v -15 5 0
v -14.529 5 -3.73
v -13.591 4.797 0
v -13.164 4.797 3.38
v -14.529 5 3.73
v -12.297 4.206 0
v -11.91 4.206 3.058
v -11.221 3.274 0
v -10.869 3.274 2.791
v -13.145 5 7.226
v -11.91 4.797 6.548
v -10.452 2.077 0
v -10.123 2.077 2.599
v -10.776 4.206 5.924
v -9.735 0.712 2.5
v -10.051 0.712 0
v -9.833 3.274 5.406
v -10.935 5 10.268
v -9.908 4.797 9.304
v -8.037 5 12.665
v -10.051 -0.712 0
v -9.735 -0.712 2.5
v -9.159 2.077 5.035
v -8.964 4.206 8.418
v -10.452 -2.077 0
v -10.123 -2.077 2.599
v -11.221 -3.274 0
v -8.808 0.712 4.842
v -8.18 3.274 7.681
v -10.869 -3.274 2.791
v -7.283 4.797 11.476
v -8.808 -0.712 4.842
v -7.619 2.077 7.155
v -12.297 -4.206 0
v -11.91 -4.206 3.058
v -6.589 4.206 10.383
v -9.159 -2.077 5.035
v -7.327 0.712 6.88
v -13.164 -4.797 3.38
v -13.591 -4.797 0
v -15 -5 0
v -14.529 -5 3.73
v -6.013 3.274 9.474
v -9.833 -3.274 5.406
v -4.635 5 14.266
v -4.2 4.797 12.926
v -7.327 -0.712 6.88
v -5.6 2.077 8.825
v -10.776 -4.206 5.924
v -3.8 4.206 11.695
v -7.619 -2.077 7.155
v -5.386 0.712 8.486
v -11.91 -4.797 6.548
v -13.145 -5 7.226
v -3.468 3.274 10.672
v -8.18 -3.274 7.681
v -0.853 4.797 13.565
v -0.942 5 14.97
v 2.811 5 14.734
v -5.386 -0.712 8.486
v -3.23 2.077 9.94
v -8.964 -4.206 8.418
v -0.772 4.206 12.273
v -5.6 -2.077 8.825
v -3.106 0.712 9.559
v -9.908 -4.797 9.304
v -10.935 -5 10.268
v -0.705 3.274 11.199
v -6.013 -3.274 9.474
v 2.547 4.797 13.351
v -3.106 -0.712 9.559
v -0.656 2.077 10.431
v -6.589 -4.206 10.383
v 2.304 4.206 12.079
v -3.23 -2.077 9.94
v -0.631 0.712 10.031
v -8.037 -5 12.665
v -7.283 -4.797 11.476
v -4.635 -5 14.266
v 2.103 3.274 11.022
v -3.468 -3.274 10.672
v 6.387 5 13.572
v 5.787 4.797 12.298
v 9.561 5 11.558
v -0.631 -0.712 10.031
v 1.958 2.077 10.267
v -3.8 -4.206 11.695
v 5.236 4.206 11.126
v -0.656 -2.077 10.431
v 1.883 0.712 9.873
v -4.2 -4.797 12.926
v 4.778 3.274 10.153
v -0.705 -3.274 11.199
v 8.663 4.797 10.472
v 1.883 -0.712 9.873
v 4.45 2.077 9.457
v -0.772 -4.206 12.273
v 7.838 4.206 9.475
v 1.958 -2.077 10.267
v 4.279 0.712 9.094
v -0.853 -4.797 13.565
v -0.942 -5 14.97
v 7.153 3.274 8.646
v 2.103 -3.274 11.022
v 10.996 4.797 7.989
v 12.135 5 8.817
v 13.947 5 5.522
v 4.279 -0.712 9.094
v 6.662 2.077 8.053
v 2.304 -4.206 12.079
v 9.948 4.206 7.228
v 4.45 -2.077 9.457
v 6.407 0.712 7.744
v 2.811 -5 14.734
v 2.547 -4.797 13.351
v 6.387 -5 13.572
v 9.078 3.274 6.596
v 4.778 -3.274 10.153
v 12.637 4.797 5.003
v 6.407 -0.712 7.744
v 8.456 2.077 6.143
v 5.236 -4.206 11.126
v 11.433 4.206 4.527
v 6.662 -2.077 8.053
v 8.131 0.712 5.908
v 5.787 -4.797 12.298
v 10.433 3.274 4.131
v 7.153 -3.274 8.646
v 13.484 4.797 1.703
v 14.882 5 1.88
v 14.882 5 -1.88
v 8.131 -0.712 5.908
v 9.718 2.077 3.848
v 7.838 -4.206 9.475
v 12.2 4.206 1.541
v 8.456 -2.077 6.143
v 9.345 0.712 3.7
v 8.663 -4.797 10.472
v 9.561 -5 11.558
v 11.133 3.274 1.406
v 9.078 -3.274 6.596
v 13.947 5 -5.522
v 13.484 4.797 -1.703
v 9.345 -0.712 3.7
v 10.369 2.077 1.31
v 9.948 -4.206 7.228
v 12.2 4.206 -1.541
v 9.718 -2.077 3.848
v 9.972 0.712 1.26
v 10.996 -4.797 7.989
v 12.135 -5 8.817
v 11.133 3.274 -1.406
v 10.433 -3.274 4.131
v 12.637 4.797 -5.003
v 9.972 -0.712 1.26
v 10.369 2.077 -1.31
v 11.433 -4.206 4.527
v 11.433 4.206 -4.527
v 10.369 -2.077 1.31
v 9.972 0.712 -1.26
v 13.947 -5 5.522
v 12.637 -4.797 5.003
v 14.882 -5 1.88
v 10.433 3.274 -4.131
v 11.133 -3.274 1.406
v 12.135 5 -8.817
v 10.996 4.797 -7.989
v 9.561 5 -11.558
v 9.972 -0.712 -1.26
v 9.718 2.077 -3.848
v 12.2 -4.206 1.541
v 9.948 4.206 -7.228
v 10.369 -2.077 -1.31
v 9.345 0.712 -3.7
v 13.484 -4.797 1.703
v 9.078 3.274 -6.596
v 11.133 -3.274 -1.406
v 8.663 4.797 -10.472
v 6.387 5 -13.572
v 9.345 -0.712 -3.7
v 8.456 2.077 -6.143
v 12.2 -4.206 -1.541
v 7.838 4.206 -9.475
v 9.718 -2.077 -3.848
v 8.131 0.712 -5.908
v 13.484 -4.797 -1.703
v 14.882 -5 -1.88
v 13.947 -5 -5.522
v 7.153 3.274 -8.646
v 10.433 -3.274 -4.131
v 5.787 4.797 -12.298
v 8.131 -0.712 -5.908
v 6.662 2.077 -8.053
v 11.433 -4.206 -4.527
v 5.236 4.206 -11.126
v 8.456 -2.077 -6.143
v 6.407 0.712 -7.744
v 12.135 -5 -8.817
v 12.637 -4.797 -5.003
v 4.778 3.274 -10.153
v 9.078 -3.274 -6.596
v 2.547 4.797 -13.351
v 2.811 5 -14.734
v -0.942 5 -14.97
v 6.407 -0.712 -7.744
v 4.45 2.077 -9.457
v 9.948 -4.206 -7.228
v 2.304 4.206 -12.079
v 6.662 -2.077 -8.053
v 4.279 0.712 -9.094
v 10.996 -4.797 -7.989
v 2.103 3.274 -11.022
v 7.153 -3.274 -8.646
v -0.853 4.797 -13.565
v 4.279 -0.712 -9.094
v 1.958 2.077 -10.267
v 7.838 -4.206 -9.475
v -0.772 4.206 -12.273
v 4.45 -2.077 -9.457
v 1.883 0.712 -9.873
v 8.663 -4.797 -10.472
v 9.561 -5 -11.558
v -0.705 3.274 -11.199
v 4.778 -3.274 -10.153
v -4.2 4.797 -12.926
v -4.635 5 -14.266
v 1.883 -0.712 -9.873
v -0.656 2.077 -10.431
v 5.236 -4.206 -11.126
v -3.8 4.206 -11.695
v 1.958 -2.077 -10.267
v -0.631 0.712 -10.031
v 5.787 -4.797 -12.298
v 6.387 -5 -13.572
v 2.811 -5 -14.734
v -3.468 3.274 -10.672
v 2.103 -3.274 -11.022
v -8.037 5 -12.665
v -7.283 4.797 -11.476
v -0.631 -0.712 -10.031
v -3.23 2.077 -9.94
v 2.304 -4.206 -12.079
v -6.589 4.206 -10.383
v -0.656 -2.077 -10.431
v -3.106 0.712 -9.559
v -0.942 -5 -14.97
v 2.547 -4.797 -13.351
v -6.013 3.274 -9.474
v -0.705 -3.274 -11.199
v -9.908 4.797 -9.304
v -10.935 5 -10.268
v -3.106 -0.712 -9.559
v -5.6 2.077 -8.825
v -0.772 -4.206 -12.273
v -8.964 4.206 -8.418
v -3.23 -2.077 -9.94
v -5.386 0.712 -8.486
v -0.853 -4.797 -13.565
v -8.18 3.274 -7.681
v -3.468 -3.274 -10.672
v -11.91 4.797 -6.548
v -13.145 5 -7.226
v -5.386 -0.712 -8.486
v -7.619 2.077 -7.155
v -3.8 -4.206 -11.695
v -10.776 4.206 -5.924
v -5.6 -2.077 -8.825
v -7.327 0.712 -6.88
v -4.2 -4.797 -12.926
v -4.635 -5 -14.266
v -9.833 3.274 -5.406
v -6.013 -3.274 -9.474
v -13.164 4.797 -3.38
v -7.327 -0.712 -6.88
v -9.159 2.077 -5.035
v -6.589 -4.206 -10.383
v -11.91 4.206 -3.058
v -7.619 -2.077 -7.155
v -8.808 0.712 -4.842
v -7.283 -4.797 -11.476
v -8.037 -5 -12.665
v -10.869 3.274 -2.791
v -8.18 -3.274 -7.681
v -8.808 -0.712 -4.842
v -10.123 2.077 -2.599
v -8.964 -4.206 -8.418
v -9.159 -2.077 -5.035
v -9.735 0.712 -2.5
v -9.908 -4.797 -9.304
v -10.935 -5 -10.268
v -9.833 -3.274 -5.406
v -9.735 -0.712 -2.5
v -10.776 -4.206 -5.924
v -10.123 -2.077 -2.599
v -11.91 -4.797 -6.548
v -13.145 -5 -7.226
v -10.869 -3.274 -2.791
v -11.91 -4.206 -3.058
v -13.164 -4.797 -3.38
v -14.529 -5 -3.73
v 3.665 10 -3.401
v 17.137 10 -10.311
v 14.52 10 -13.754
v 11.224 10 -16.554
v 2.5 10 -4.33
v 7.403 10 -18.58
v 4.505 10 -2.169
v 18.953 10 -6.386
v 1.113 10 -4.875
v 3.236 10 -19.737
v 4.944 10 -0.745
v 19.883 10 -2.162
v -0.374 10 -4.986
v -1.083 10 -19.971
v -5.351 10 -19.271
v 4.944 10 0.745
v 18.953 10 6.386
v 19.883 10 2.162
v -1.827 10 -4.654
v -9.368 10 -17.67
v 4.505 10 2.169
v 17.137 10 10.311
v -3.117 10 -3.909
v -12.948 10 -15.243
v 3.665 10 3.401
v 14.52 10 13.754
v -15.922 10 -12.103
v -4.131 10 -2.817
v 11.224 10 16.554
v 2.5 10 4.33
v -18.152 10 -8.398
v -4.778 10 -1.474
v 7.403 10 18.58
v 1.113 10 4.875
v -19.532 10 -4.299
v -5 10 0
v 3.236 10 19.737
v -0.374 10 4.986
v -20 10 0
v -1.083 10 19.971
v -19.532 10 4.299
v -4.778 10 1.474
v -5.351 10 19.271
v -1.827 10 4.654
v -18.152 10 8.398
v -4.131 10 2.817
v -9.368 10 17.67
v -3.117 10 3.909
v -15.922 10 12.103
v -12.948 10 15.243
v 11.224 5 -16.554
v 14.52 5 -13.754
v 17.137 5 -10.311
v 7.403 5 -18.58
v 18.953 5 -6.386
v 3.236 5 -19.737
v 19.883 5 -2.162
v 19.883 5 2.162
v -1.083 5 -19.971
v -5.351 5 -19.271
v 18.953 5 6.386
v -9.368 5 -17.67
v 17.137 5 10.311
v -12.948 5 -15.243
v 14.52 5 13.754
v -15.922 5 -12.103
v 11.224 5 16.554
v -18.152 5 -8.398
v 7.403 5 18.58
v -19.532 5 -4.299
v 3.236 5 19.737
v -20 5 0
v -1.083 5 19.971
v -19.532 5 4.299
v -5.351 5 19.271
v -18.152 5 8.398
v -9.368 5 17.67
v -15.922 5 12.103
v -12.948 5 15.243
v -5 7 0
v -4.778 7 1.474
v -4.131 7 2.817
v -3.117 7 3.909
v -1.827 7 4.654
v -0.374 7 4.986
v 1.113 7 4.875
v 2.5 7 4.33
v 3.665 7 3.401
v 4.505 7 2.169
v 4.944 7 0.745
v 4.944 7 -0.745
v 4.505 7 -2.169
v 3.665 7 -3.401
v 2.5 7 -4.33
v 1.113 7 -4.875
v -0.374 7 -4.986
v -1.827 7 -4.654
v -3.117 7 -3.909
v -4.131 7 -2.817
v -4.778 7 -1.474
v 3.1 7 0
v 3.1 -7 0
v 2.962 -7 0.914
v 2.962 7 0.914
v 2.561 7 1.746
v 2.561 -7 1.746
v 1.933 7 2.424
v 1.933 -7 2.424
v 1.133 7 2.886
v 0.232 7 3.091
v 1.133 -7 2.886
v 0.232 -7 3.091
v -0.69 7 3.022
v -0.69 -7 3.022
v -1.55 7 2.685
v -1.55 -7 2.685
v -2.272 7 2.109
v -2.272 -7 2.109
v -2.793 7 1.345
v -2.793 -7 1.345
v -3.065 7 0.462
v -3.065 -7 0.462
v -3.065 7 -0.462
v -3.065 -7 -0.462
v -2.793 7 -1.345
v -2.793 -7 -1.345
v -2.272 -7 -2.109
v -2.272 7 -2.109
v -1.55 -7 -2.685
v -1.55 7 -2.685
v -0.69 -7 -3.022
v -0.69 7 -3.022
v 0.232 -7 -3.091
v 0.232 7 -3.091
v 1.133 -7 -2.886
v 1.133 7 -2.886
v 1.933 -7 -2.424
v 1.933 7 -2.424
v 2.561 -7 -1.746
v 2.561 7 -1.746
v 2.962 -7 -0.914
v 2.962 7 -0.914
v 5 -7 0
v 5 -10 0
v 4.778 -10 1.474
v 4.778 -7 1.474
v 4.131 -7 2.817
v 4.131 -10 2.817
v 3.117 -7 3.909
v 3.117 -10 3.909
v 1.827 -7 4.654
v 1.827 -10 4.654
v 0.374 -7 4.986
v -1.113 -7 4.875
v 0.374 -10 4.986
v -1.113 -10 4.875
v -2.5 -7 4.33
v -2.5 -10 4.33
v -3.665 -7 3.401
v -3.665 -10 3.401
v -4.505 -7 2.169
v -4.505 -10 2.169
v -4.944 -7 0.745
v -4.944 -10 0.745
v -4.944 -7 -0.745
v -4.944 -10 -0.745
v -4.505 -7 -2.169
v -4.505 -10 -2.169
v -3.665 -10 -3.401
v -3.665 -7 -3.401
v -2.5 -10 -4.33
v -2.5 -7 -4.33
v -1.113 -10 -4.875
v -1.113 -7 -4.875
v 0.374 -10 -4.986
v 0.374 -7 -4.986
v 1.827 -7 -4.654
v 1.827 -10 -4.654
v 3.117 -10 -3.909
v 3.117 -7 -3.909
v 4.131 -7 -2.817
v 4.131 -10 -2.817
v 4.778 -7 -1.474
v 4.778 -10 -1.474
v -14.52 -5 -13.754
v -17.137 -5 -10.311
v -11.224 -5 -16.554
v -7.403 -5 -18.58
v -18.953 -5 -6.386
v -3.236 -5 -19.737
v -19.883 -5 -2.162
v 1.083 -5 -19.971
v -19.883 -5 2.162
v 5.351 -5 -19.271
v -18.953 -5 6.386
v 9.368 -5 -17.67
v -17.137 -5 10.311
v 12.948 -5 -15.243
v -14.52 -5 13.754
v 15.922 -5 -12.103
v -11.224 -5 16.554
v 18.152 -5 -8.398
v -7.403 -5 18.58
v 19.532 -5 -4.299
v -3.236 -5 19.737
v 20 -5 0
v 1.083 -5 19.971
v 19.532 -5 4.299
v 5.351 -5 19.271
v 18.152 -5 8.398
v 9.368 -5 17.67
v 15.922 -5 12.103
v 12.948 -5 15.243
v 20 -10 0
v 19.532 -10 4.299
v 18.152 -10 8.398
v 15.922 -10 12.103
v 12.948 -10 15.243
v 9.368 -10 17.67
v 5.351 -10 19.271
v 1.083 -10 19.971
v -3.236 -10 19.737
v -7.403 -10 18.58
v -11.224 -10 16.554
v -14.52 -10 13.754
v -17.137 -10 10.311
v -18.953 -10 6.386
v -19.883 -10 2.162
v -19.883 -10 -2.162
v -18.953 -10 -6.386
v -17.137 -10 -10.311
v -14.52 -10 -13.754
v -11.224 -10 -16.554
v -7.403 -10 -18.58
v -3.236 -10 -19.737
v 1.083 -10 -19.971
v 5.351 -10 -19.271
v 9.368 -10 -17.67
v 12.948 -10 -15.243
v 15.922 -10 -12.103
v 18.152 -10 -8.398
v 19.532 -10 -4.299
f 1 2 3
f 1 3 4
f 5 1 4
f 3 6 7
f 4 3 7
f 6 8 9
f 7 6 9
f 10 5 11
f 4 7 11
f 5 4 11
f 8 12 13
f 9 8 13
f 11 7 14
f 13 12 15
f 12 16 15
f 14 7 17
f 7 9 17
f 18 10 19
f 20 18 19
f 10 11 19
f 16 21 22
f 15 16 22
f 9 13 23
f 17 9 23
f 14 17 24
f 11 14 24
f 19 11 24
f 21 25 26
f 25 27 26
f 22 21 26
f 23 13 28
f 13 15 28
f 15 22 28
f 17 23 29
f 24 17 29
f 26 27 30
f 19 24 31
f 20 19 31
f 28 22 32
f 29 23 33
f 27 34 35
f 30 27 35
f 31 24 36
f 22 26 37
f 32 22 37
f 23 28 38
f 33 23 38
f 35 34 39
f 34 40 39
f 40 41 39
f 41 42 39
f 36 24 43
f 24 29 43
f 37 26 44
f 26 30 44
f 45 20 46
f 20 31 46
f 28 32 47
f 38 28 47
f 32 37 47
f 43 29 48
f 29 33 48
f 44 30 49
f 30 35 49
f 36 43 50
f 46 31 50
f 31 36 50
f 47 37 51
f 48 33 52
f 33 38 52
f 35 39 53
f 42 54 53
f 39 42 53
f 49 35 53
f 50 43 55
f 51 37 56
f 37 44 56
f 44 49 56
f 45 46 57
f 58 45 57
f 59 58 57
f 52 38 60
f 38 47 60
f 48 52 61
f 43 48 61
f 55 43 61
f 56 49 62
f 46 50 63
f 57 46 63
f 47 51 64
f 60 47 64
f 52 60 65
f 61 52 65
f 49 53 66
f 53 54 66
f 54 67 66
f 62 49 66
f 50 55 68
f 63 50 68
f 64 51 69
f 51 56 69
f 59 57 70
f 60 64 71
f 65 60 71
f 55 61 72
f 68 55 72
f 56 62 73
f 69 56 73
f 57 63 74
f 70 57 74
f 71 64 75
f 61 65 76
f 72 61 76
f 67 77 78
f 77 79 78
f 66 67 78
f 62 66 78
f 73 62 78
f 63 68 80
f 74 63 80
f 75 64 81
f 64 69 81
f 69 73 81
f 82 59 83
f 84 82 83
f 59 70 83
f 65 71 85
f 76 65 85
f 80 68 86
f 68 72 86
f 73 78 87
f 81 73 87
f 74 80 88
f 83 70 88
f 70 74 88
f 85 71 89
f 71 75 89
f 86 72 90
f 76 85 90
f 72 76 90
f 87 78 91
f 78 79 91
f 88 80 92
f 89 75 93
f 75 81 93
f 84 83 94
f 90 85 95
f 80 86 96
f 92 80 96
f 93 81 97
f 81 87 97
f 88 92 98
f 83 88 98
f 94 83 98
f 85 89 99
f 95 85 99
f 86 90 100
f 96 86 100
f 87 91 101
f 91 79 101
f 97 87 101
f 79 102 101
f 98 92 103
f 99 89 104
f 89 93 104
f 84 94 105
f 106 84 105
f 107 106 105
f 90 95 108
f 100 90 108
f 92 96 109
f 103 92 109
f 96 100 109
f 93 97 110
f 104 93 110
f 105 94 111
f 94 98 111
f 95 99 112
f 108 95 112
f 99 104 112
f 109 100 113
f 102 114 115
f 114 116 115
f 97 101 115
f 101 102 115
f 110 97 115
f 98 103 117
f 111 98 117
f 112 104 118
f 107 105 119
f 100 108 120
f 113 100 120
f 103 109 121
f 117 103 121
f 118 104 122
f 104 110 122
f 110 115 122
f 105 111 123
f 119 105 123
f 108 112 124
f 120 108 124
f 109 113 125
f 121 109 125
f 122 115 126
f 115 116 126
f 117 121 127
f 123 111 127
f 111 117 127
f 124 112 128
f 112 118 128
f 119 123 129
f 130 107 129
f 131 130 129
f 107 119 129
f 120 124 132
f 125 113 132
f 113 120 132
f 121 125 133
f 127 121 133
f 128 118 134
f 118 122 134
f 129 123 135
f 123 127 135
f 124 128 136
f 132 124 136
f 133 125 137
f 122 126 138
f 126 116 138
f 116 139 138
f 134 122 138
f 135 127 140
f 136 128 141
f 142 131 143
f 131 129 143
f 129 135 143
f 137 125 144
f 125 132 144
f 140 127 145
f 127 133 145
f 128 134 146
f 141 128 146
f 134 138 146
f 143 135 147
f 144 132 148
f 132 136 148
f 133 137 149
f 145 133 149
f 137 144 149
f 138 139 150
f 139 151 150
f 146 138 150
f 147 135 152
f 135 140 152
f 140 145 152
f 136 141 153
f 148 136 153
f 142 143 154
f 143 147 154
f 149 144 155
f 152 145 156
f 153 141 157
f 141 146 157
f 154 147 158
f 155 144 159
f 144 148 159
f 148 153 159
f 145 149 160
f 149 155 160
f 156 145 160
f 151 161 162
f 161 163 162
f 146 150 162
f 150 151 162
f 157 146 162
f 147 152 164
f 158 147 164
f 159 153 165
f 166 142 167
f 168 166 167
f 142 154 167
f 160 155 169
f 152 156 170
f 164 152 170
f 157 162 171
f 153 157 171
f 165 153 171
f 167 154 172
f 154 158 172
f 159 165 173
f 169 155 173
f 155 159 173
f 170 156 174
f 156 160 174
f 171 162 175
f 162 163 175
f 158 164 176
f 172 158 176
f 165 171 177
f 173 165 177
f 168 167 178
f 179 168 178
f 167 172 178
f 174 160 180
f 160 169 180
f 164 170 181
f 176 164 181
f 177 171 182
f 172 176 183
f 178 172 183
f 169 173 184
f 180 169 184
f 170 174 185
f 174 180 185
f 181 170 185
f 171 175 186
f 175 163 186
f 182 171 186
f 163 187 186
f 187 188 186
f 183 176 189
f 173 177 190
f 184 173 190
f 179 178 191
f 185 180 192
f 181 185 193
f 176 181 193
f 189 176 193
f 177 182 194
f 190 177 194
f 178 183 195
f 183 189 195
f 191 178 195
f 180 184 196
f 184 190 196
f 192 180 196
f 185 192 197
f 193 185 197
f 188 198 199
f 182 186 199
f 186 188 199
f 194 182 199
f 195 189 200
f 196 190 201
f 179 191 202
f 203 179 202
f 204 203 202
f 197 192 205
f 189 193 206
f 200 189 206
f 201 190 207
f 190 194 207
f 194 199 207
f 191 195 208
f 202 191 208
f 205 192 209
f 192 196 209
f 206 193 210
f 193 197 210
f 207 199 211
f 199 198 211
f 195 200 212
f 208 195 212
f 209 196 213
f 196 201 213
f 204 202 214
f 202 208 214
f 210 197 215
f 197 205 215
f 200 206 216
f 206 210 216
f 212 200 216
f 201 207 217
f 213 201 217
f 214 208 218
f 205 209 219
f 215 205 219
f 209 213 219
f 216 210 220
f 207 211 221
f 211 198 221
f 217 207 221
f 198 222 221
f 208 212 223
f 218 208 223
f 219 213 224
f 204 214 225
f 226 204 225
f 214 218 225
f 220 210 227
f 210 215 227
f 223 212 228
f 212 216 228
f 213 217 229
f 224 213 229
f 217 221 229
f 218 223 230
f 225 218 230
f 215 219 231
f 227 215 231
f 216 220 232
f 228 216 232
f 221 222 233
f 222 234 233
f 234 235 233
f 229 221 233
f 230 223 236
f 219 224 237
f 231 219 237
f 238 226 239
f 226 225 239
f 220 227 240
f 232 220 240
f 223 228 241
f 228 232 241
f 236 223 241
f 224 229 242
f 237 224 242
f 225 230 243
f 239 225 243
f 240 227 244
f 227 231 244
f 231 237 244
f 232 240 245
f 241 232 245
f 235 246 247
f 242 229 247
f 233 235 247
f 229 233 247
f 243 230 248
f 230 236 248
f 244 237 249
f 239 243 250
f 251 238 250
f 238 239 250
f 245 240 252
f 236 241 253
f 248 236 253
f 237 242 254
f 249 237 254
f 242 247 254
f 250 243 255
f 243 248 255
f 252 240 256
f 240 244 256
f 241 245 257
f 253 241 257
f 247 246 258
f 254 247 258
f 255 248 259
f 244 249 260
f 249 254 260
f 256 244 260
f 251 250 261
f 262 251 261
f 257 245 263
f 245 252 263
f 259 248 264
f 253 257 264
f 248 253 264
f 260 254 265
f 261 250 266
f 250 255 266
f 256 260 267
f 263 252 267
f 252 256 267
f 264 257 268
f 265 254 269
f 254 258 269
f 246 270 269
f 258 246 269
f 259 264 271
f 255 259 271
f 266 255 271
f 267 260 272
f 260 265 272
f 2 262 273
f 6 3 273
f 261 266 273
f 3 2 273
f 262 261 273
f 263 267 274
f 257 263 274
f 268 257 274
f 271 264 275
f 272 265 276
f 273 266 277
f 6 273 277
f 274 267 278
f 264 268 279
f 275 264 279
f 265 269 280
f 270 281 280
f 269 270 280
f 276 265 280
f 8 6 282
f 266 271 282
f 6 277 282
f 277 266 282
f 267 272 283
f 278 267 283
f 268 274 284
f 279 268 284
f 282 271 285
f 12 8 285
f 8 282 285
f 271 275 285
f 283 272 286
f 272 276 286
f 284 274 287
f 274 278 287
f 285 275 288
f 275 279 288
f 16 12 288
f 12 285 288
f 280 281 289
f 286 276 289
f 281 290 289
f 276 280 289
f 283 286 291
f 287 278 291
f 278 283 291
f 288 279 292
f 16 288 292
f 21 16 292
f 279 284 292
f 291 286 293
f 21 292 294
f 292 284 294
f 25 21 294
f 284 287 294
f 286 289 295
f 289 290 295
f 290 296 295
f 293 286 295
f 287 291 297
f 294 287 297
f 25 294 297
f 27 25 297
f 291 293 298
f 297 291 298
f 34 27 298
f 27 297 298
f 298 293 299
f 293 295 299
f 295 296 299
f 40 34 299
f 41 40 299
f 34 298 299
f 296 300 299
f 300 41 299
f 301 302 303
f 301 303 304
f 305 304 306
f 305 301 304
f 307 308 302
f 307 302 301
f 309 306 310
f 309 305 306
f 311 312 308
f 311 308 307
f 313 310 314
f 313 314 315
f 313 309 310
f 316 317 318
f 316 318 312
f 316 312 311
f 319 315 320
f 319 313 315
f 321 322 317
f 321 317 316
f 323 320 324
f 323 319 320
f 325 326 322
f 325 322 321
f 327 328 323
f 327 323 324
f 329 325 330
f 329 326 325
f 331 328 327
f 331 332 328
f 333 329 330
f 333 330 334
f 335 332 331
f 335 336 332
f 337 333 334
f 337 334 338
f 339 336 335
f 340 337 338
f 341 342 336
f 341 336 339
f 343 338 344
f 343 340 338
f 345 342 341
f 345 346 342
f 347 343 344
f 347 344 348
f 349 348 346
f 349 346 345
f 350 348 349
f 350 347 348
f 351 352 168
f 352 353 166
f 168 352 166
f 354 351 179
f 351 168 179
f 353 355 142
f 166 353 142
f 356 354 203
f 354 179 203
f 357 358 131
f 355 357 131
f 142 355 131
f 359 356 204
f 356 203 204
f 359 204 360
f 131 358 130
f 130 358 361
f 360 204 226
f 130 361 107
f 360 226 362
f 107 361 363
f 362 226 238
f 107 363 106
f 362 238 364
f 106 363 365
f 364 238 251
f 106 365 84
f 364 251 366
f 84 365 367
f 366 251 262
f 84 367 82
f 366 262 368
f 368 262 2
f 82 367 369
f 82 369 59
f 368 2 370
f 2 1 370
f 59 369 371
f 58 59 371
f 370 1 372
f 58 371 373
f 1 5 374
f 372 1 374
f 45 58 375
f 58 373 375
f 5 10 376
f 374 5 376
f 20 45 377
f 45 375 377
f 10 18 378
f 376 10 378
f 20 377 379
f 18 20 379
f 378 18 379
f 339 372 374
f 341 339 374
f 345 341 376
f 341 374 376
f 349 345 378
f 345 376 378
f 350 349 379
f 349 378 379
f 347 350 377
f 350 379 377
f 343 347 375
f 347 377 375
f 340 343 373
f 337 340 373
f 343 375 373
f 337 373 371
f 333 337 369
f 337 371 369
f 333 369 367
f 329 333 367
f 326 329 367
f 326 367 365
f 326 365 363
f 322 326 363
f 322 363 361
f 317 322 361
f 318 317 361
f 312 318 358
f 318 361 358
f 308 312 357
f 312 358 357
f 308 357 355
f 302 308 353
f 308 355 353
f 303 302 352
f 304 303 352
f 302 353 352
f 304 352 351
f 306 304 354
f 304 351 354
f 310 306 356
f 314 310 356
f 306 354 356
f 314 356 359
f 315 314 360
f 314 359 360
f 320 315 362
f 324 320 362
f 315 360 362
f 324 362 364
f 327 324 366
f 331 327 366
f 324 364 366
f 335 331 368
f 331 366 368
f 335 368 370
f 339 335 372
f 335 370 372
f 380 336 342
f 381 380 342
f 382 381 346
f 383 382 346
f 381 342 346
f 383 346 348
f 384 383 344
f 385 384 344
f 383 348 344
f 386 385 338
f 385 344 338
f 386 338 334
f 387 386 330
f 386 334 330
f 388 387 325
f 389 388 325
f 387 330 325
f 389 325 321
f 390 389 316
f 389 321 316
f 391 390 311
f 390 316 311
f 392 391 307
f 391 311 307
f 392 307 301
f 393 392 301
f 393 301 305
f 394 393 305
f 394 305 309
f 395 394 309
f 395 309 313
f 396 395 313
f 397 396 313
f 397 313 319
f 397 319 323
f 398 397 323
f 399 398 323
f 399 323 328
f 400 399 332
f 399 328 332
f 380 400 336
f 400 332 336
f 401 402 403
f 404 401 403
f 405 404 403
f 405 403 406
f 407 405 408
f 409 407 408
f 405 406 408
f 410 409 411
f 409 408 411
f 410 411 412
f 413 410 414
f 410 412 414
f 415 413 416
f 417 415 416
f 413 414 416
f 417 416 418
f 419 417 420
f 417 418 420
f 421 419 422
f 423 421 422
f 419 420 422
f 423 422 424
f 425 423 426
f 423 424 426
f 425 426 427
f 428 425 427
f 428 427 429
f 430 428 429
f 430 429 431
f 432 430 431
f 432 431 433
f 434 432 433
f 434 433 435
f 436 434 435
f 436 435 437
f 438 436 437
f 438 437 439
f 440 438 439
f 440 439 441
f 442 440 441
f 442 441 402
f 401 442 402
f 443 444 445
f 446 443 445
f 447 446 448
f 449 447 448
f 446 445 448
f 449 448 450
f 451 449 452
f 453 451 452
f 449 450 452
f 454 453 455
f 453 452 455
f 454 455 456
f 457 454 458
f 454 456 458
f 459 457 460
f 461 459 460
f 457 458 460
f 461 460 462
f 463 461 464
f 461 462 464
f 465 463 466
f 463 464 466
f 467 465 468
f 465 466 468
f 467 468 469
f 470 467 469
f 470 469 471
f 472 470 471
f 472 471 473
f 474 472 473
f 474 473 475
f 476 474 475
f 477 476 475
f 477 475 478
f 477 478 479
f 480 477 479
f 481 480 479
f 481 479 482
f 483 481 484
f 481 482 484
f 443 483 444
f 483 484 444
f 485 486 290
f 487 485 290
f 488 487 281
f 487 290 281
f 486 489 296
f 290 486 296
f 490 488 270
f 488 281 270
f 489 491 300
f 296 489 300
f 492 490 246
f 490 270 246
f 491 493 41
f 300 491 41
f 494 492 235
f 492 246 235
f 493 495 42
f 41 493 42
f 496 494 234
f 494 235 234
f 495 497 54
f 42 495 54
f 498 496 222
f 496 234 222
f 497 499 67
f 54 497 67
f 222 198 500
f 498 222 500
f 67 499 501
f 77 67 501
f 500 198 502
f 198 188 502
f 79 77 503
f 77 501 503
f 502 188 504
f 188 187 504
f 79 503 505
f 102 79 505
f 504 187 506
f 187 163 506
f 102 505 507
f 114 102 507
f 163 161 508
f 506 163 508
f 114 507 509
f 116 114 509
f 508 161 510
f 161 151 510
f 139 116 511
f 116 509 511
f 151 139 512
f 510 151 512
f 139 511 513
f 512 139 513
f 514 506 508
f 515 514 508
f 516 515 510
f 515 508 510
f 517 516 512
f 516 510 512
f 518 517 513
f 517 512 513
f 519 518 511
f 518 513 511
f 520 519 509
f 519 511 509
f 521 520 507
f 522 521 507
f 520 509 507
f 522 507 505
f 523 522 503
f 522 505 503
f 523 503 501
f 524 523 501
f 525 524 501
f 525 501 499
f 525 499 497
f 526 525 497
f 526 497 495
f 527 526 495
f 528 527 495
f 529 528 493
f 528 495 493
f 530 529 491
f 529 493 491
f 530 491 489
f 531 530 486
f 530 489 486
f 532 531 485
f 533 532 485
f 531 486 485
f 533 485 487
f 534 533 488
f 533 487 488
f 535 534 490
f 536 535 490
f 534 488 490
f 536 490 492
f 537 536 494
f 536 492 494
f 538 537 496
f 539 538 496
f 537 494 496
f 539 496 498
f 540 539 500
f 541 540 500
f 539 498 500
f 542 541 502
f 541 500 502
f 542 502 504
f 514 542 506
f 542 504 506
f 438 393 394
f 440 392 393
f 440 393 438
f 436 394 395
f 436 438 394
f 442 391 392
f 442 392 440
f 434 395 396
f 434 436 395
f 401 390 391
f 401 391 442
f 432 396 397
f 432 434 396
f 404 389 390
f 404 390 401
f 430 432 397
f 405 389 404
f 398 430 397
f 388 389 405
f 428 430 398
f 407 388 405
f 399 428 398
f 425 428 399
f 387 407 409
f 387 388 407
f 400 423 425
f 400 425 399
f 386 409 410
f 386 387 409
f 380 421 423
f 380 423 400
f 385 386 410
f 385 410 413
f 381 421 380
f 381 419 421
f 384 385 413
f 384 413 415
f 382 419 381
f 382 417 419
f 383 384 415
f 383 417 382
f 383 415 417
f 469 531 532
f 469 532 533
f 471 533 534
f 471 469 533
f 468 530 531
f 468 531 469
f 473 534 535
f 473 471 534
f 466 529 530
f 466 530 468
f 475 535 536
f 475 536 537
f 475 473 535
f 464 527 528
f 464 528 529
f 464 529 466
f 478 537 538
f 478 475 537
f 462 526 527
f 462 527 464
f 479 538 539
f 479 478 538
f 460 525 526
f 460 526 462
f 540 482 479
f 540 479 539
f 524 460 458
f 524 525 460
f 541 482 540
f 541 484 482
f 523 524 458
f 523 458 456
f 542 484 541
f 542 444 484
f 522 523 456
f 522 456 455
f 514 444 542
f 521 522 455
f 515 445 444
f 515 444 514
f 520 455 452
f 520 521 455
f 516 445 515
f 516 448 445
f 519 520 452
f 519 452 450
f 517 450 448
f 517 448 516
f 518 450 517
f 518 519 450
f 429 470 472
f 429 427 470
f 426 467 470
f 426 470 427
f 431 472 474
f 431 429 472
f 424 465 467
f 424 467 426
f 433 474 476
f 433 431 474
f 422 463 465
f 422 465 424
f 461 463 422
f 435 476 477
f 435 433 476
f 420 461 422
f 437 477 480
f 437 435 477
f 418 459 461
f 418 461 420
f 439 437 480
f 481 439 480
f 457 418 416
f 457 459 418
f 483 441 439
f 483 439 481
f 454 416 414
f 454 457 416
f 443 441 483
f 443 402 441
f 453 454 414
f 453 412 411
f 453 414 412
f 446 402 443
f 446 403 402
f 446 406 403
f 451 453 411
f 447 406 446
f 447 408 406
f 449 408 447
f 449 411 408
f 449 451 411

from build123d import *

# Parameters (mm, degrees)
F0_R      = 15
F1_DEPTH  = 5
F2_R      = 15
F3_DEPTH  = 5
F4_R      = 5
F6_R      = 20
F7_DEPTH  = 5
F8_R      = 20
F9_DEPTH  = 5
F10_R     = 3.1
F11_DEPTH = 25
F10_R_2   = 5
F12_DEPTH = 3
F13_R     = 5
F13_R_2   = 3.1
F14_DEPTH = 3


with BuildPart() as f1:
    # F0 (on Front) → F1 (new body)
    with BuildSketch(Plane.XZ):
        Circle(F0_R)
    extrude(amount=F1_DEPTH)

    # F2 (on face) → F3 (join)
    with BuildSketch(Plane(origin=(0, 0, 0), x_dir=(-1, 0, 0), z_dir=(0, 1, 0))):
        Circle(F2_R)
    extrude(amount=F3_DEPTH)

    # F5: sweep along a path in F2
    with BuildLine(Plane(origin=(0, 0, 0), x_dir=(-1, 0, 0), z_dir=(0, 1, 0))) as f5_path:
        CenterArc((0, 0), 15, 0, 360)
    # F4 (on Right) → F5 (sweep, cut)
    with BuildSketch(Plane.YZ):
        with Locations((0, -15)):
            Circle(F4_R)
    sweep(path=f5_path.line, mode=Mode.SUBTRACT)

    # F6 (on face) → F7 (join)
    with BuildSketch(Plane.XZ.offset(5)):
        Circle(F6_R)
    extrude(amount=F7_DEPTH)

    # F8 (on face) → F9 (join)
    with BuildSketch(Plane(origin=(0, 5, 0), x_dir=(-1, 0, 0), z_dir=(0, 1, 0))):
        Circle(F8_R)
    extrude(amount=F9_DEPTH)

    # F10 (on face) → F11 (cut)
    with BuildSketch(Plane.XZ.offset(10)):
        Circle(F10_R)
    extrude(amount=-F11_DEPTH, mode=Mode.SUBTRACT)

    # F10 (on face) → F12 (cut)
    with BuildSketch(Plane.XZ.offset(10)):
        Circle(F10_R_2)
        Circle(F10_R, mode=Mode.SUBTRACT)
    extrude(amount=-F12_DEPTH, mode=Mode.SUBTRACT)

    # F13 (on face) → F14 (cut)
    with BuildSketch(Plane(origin=(0, 10, 0), x_dir=(-1, 0, 0), z_dir=(0, 1, 0))):
        Circle(F13_R)
        Circle(F13_R_2, mode=Mode.SUBTRACT)
    extrude(amount=-F14_DEPTH, mode=Mode.SUBTRACT)


solid = f1.part
